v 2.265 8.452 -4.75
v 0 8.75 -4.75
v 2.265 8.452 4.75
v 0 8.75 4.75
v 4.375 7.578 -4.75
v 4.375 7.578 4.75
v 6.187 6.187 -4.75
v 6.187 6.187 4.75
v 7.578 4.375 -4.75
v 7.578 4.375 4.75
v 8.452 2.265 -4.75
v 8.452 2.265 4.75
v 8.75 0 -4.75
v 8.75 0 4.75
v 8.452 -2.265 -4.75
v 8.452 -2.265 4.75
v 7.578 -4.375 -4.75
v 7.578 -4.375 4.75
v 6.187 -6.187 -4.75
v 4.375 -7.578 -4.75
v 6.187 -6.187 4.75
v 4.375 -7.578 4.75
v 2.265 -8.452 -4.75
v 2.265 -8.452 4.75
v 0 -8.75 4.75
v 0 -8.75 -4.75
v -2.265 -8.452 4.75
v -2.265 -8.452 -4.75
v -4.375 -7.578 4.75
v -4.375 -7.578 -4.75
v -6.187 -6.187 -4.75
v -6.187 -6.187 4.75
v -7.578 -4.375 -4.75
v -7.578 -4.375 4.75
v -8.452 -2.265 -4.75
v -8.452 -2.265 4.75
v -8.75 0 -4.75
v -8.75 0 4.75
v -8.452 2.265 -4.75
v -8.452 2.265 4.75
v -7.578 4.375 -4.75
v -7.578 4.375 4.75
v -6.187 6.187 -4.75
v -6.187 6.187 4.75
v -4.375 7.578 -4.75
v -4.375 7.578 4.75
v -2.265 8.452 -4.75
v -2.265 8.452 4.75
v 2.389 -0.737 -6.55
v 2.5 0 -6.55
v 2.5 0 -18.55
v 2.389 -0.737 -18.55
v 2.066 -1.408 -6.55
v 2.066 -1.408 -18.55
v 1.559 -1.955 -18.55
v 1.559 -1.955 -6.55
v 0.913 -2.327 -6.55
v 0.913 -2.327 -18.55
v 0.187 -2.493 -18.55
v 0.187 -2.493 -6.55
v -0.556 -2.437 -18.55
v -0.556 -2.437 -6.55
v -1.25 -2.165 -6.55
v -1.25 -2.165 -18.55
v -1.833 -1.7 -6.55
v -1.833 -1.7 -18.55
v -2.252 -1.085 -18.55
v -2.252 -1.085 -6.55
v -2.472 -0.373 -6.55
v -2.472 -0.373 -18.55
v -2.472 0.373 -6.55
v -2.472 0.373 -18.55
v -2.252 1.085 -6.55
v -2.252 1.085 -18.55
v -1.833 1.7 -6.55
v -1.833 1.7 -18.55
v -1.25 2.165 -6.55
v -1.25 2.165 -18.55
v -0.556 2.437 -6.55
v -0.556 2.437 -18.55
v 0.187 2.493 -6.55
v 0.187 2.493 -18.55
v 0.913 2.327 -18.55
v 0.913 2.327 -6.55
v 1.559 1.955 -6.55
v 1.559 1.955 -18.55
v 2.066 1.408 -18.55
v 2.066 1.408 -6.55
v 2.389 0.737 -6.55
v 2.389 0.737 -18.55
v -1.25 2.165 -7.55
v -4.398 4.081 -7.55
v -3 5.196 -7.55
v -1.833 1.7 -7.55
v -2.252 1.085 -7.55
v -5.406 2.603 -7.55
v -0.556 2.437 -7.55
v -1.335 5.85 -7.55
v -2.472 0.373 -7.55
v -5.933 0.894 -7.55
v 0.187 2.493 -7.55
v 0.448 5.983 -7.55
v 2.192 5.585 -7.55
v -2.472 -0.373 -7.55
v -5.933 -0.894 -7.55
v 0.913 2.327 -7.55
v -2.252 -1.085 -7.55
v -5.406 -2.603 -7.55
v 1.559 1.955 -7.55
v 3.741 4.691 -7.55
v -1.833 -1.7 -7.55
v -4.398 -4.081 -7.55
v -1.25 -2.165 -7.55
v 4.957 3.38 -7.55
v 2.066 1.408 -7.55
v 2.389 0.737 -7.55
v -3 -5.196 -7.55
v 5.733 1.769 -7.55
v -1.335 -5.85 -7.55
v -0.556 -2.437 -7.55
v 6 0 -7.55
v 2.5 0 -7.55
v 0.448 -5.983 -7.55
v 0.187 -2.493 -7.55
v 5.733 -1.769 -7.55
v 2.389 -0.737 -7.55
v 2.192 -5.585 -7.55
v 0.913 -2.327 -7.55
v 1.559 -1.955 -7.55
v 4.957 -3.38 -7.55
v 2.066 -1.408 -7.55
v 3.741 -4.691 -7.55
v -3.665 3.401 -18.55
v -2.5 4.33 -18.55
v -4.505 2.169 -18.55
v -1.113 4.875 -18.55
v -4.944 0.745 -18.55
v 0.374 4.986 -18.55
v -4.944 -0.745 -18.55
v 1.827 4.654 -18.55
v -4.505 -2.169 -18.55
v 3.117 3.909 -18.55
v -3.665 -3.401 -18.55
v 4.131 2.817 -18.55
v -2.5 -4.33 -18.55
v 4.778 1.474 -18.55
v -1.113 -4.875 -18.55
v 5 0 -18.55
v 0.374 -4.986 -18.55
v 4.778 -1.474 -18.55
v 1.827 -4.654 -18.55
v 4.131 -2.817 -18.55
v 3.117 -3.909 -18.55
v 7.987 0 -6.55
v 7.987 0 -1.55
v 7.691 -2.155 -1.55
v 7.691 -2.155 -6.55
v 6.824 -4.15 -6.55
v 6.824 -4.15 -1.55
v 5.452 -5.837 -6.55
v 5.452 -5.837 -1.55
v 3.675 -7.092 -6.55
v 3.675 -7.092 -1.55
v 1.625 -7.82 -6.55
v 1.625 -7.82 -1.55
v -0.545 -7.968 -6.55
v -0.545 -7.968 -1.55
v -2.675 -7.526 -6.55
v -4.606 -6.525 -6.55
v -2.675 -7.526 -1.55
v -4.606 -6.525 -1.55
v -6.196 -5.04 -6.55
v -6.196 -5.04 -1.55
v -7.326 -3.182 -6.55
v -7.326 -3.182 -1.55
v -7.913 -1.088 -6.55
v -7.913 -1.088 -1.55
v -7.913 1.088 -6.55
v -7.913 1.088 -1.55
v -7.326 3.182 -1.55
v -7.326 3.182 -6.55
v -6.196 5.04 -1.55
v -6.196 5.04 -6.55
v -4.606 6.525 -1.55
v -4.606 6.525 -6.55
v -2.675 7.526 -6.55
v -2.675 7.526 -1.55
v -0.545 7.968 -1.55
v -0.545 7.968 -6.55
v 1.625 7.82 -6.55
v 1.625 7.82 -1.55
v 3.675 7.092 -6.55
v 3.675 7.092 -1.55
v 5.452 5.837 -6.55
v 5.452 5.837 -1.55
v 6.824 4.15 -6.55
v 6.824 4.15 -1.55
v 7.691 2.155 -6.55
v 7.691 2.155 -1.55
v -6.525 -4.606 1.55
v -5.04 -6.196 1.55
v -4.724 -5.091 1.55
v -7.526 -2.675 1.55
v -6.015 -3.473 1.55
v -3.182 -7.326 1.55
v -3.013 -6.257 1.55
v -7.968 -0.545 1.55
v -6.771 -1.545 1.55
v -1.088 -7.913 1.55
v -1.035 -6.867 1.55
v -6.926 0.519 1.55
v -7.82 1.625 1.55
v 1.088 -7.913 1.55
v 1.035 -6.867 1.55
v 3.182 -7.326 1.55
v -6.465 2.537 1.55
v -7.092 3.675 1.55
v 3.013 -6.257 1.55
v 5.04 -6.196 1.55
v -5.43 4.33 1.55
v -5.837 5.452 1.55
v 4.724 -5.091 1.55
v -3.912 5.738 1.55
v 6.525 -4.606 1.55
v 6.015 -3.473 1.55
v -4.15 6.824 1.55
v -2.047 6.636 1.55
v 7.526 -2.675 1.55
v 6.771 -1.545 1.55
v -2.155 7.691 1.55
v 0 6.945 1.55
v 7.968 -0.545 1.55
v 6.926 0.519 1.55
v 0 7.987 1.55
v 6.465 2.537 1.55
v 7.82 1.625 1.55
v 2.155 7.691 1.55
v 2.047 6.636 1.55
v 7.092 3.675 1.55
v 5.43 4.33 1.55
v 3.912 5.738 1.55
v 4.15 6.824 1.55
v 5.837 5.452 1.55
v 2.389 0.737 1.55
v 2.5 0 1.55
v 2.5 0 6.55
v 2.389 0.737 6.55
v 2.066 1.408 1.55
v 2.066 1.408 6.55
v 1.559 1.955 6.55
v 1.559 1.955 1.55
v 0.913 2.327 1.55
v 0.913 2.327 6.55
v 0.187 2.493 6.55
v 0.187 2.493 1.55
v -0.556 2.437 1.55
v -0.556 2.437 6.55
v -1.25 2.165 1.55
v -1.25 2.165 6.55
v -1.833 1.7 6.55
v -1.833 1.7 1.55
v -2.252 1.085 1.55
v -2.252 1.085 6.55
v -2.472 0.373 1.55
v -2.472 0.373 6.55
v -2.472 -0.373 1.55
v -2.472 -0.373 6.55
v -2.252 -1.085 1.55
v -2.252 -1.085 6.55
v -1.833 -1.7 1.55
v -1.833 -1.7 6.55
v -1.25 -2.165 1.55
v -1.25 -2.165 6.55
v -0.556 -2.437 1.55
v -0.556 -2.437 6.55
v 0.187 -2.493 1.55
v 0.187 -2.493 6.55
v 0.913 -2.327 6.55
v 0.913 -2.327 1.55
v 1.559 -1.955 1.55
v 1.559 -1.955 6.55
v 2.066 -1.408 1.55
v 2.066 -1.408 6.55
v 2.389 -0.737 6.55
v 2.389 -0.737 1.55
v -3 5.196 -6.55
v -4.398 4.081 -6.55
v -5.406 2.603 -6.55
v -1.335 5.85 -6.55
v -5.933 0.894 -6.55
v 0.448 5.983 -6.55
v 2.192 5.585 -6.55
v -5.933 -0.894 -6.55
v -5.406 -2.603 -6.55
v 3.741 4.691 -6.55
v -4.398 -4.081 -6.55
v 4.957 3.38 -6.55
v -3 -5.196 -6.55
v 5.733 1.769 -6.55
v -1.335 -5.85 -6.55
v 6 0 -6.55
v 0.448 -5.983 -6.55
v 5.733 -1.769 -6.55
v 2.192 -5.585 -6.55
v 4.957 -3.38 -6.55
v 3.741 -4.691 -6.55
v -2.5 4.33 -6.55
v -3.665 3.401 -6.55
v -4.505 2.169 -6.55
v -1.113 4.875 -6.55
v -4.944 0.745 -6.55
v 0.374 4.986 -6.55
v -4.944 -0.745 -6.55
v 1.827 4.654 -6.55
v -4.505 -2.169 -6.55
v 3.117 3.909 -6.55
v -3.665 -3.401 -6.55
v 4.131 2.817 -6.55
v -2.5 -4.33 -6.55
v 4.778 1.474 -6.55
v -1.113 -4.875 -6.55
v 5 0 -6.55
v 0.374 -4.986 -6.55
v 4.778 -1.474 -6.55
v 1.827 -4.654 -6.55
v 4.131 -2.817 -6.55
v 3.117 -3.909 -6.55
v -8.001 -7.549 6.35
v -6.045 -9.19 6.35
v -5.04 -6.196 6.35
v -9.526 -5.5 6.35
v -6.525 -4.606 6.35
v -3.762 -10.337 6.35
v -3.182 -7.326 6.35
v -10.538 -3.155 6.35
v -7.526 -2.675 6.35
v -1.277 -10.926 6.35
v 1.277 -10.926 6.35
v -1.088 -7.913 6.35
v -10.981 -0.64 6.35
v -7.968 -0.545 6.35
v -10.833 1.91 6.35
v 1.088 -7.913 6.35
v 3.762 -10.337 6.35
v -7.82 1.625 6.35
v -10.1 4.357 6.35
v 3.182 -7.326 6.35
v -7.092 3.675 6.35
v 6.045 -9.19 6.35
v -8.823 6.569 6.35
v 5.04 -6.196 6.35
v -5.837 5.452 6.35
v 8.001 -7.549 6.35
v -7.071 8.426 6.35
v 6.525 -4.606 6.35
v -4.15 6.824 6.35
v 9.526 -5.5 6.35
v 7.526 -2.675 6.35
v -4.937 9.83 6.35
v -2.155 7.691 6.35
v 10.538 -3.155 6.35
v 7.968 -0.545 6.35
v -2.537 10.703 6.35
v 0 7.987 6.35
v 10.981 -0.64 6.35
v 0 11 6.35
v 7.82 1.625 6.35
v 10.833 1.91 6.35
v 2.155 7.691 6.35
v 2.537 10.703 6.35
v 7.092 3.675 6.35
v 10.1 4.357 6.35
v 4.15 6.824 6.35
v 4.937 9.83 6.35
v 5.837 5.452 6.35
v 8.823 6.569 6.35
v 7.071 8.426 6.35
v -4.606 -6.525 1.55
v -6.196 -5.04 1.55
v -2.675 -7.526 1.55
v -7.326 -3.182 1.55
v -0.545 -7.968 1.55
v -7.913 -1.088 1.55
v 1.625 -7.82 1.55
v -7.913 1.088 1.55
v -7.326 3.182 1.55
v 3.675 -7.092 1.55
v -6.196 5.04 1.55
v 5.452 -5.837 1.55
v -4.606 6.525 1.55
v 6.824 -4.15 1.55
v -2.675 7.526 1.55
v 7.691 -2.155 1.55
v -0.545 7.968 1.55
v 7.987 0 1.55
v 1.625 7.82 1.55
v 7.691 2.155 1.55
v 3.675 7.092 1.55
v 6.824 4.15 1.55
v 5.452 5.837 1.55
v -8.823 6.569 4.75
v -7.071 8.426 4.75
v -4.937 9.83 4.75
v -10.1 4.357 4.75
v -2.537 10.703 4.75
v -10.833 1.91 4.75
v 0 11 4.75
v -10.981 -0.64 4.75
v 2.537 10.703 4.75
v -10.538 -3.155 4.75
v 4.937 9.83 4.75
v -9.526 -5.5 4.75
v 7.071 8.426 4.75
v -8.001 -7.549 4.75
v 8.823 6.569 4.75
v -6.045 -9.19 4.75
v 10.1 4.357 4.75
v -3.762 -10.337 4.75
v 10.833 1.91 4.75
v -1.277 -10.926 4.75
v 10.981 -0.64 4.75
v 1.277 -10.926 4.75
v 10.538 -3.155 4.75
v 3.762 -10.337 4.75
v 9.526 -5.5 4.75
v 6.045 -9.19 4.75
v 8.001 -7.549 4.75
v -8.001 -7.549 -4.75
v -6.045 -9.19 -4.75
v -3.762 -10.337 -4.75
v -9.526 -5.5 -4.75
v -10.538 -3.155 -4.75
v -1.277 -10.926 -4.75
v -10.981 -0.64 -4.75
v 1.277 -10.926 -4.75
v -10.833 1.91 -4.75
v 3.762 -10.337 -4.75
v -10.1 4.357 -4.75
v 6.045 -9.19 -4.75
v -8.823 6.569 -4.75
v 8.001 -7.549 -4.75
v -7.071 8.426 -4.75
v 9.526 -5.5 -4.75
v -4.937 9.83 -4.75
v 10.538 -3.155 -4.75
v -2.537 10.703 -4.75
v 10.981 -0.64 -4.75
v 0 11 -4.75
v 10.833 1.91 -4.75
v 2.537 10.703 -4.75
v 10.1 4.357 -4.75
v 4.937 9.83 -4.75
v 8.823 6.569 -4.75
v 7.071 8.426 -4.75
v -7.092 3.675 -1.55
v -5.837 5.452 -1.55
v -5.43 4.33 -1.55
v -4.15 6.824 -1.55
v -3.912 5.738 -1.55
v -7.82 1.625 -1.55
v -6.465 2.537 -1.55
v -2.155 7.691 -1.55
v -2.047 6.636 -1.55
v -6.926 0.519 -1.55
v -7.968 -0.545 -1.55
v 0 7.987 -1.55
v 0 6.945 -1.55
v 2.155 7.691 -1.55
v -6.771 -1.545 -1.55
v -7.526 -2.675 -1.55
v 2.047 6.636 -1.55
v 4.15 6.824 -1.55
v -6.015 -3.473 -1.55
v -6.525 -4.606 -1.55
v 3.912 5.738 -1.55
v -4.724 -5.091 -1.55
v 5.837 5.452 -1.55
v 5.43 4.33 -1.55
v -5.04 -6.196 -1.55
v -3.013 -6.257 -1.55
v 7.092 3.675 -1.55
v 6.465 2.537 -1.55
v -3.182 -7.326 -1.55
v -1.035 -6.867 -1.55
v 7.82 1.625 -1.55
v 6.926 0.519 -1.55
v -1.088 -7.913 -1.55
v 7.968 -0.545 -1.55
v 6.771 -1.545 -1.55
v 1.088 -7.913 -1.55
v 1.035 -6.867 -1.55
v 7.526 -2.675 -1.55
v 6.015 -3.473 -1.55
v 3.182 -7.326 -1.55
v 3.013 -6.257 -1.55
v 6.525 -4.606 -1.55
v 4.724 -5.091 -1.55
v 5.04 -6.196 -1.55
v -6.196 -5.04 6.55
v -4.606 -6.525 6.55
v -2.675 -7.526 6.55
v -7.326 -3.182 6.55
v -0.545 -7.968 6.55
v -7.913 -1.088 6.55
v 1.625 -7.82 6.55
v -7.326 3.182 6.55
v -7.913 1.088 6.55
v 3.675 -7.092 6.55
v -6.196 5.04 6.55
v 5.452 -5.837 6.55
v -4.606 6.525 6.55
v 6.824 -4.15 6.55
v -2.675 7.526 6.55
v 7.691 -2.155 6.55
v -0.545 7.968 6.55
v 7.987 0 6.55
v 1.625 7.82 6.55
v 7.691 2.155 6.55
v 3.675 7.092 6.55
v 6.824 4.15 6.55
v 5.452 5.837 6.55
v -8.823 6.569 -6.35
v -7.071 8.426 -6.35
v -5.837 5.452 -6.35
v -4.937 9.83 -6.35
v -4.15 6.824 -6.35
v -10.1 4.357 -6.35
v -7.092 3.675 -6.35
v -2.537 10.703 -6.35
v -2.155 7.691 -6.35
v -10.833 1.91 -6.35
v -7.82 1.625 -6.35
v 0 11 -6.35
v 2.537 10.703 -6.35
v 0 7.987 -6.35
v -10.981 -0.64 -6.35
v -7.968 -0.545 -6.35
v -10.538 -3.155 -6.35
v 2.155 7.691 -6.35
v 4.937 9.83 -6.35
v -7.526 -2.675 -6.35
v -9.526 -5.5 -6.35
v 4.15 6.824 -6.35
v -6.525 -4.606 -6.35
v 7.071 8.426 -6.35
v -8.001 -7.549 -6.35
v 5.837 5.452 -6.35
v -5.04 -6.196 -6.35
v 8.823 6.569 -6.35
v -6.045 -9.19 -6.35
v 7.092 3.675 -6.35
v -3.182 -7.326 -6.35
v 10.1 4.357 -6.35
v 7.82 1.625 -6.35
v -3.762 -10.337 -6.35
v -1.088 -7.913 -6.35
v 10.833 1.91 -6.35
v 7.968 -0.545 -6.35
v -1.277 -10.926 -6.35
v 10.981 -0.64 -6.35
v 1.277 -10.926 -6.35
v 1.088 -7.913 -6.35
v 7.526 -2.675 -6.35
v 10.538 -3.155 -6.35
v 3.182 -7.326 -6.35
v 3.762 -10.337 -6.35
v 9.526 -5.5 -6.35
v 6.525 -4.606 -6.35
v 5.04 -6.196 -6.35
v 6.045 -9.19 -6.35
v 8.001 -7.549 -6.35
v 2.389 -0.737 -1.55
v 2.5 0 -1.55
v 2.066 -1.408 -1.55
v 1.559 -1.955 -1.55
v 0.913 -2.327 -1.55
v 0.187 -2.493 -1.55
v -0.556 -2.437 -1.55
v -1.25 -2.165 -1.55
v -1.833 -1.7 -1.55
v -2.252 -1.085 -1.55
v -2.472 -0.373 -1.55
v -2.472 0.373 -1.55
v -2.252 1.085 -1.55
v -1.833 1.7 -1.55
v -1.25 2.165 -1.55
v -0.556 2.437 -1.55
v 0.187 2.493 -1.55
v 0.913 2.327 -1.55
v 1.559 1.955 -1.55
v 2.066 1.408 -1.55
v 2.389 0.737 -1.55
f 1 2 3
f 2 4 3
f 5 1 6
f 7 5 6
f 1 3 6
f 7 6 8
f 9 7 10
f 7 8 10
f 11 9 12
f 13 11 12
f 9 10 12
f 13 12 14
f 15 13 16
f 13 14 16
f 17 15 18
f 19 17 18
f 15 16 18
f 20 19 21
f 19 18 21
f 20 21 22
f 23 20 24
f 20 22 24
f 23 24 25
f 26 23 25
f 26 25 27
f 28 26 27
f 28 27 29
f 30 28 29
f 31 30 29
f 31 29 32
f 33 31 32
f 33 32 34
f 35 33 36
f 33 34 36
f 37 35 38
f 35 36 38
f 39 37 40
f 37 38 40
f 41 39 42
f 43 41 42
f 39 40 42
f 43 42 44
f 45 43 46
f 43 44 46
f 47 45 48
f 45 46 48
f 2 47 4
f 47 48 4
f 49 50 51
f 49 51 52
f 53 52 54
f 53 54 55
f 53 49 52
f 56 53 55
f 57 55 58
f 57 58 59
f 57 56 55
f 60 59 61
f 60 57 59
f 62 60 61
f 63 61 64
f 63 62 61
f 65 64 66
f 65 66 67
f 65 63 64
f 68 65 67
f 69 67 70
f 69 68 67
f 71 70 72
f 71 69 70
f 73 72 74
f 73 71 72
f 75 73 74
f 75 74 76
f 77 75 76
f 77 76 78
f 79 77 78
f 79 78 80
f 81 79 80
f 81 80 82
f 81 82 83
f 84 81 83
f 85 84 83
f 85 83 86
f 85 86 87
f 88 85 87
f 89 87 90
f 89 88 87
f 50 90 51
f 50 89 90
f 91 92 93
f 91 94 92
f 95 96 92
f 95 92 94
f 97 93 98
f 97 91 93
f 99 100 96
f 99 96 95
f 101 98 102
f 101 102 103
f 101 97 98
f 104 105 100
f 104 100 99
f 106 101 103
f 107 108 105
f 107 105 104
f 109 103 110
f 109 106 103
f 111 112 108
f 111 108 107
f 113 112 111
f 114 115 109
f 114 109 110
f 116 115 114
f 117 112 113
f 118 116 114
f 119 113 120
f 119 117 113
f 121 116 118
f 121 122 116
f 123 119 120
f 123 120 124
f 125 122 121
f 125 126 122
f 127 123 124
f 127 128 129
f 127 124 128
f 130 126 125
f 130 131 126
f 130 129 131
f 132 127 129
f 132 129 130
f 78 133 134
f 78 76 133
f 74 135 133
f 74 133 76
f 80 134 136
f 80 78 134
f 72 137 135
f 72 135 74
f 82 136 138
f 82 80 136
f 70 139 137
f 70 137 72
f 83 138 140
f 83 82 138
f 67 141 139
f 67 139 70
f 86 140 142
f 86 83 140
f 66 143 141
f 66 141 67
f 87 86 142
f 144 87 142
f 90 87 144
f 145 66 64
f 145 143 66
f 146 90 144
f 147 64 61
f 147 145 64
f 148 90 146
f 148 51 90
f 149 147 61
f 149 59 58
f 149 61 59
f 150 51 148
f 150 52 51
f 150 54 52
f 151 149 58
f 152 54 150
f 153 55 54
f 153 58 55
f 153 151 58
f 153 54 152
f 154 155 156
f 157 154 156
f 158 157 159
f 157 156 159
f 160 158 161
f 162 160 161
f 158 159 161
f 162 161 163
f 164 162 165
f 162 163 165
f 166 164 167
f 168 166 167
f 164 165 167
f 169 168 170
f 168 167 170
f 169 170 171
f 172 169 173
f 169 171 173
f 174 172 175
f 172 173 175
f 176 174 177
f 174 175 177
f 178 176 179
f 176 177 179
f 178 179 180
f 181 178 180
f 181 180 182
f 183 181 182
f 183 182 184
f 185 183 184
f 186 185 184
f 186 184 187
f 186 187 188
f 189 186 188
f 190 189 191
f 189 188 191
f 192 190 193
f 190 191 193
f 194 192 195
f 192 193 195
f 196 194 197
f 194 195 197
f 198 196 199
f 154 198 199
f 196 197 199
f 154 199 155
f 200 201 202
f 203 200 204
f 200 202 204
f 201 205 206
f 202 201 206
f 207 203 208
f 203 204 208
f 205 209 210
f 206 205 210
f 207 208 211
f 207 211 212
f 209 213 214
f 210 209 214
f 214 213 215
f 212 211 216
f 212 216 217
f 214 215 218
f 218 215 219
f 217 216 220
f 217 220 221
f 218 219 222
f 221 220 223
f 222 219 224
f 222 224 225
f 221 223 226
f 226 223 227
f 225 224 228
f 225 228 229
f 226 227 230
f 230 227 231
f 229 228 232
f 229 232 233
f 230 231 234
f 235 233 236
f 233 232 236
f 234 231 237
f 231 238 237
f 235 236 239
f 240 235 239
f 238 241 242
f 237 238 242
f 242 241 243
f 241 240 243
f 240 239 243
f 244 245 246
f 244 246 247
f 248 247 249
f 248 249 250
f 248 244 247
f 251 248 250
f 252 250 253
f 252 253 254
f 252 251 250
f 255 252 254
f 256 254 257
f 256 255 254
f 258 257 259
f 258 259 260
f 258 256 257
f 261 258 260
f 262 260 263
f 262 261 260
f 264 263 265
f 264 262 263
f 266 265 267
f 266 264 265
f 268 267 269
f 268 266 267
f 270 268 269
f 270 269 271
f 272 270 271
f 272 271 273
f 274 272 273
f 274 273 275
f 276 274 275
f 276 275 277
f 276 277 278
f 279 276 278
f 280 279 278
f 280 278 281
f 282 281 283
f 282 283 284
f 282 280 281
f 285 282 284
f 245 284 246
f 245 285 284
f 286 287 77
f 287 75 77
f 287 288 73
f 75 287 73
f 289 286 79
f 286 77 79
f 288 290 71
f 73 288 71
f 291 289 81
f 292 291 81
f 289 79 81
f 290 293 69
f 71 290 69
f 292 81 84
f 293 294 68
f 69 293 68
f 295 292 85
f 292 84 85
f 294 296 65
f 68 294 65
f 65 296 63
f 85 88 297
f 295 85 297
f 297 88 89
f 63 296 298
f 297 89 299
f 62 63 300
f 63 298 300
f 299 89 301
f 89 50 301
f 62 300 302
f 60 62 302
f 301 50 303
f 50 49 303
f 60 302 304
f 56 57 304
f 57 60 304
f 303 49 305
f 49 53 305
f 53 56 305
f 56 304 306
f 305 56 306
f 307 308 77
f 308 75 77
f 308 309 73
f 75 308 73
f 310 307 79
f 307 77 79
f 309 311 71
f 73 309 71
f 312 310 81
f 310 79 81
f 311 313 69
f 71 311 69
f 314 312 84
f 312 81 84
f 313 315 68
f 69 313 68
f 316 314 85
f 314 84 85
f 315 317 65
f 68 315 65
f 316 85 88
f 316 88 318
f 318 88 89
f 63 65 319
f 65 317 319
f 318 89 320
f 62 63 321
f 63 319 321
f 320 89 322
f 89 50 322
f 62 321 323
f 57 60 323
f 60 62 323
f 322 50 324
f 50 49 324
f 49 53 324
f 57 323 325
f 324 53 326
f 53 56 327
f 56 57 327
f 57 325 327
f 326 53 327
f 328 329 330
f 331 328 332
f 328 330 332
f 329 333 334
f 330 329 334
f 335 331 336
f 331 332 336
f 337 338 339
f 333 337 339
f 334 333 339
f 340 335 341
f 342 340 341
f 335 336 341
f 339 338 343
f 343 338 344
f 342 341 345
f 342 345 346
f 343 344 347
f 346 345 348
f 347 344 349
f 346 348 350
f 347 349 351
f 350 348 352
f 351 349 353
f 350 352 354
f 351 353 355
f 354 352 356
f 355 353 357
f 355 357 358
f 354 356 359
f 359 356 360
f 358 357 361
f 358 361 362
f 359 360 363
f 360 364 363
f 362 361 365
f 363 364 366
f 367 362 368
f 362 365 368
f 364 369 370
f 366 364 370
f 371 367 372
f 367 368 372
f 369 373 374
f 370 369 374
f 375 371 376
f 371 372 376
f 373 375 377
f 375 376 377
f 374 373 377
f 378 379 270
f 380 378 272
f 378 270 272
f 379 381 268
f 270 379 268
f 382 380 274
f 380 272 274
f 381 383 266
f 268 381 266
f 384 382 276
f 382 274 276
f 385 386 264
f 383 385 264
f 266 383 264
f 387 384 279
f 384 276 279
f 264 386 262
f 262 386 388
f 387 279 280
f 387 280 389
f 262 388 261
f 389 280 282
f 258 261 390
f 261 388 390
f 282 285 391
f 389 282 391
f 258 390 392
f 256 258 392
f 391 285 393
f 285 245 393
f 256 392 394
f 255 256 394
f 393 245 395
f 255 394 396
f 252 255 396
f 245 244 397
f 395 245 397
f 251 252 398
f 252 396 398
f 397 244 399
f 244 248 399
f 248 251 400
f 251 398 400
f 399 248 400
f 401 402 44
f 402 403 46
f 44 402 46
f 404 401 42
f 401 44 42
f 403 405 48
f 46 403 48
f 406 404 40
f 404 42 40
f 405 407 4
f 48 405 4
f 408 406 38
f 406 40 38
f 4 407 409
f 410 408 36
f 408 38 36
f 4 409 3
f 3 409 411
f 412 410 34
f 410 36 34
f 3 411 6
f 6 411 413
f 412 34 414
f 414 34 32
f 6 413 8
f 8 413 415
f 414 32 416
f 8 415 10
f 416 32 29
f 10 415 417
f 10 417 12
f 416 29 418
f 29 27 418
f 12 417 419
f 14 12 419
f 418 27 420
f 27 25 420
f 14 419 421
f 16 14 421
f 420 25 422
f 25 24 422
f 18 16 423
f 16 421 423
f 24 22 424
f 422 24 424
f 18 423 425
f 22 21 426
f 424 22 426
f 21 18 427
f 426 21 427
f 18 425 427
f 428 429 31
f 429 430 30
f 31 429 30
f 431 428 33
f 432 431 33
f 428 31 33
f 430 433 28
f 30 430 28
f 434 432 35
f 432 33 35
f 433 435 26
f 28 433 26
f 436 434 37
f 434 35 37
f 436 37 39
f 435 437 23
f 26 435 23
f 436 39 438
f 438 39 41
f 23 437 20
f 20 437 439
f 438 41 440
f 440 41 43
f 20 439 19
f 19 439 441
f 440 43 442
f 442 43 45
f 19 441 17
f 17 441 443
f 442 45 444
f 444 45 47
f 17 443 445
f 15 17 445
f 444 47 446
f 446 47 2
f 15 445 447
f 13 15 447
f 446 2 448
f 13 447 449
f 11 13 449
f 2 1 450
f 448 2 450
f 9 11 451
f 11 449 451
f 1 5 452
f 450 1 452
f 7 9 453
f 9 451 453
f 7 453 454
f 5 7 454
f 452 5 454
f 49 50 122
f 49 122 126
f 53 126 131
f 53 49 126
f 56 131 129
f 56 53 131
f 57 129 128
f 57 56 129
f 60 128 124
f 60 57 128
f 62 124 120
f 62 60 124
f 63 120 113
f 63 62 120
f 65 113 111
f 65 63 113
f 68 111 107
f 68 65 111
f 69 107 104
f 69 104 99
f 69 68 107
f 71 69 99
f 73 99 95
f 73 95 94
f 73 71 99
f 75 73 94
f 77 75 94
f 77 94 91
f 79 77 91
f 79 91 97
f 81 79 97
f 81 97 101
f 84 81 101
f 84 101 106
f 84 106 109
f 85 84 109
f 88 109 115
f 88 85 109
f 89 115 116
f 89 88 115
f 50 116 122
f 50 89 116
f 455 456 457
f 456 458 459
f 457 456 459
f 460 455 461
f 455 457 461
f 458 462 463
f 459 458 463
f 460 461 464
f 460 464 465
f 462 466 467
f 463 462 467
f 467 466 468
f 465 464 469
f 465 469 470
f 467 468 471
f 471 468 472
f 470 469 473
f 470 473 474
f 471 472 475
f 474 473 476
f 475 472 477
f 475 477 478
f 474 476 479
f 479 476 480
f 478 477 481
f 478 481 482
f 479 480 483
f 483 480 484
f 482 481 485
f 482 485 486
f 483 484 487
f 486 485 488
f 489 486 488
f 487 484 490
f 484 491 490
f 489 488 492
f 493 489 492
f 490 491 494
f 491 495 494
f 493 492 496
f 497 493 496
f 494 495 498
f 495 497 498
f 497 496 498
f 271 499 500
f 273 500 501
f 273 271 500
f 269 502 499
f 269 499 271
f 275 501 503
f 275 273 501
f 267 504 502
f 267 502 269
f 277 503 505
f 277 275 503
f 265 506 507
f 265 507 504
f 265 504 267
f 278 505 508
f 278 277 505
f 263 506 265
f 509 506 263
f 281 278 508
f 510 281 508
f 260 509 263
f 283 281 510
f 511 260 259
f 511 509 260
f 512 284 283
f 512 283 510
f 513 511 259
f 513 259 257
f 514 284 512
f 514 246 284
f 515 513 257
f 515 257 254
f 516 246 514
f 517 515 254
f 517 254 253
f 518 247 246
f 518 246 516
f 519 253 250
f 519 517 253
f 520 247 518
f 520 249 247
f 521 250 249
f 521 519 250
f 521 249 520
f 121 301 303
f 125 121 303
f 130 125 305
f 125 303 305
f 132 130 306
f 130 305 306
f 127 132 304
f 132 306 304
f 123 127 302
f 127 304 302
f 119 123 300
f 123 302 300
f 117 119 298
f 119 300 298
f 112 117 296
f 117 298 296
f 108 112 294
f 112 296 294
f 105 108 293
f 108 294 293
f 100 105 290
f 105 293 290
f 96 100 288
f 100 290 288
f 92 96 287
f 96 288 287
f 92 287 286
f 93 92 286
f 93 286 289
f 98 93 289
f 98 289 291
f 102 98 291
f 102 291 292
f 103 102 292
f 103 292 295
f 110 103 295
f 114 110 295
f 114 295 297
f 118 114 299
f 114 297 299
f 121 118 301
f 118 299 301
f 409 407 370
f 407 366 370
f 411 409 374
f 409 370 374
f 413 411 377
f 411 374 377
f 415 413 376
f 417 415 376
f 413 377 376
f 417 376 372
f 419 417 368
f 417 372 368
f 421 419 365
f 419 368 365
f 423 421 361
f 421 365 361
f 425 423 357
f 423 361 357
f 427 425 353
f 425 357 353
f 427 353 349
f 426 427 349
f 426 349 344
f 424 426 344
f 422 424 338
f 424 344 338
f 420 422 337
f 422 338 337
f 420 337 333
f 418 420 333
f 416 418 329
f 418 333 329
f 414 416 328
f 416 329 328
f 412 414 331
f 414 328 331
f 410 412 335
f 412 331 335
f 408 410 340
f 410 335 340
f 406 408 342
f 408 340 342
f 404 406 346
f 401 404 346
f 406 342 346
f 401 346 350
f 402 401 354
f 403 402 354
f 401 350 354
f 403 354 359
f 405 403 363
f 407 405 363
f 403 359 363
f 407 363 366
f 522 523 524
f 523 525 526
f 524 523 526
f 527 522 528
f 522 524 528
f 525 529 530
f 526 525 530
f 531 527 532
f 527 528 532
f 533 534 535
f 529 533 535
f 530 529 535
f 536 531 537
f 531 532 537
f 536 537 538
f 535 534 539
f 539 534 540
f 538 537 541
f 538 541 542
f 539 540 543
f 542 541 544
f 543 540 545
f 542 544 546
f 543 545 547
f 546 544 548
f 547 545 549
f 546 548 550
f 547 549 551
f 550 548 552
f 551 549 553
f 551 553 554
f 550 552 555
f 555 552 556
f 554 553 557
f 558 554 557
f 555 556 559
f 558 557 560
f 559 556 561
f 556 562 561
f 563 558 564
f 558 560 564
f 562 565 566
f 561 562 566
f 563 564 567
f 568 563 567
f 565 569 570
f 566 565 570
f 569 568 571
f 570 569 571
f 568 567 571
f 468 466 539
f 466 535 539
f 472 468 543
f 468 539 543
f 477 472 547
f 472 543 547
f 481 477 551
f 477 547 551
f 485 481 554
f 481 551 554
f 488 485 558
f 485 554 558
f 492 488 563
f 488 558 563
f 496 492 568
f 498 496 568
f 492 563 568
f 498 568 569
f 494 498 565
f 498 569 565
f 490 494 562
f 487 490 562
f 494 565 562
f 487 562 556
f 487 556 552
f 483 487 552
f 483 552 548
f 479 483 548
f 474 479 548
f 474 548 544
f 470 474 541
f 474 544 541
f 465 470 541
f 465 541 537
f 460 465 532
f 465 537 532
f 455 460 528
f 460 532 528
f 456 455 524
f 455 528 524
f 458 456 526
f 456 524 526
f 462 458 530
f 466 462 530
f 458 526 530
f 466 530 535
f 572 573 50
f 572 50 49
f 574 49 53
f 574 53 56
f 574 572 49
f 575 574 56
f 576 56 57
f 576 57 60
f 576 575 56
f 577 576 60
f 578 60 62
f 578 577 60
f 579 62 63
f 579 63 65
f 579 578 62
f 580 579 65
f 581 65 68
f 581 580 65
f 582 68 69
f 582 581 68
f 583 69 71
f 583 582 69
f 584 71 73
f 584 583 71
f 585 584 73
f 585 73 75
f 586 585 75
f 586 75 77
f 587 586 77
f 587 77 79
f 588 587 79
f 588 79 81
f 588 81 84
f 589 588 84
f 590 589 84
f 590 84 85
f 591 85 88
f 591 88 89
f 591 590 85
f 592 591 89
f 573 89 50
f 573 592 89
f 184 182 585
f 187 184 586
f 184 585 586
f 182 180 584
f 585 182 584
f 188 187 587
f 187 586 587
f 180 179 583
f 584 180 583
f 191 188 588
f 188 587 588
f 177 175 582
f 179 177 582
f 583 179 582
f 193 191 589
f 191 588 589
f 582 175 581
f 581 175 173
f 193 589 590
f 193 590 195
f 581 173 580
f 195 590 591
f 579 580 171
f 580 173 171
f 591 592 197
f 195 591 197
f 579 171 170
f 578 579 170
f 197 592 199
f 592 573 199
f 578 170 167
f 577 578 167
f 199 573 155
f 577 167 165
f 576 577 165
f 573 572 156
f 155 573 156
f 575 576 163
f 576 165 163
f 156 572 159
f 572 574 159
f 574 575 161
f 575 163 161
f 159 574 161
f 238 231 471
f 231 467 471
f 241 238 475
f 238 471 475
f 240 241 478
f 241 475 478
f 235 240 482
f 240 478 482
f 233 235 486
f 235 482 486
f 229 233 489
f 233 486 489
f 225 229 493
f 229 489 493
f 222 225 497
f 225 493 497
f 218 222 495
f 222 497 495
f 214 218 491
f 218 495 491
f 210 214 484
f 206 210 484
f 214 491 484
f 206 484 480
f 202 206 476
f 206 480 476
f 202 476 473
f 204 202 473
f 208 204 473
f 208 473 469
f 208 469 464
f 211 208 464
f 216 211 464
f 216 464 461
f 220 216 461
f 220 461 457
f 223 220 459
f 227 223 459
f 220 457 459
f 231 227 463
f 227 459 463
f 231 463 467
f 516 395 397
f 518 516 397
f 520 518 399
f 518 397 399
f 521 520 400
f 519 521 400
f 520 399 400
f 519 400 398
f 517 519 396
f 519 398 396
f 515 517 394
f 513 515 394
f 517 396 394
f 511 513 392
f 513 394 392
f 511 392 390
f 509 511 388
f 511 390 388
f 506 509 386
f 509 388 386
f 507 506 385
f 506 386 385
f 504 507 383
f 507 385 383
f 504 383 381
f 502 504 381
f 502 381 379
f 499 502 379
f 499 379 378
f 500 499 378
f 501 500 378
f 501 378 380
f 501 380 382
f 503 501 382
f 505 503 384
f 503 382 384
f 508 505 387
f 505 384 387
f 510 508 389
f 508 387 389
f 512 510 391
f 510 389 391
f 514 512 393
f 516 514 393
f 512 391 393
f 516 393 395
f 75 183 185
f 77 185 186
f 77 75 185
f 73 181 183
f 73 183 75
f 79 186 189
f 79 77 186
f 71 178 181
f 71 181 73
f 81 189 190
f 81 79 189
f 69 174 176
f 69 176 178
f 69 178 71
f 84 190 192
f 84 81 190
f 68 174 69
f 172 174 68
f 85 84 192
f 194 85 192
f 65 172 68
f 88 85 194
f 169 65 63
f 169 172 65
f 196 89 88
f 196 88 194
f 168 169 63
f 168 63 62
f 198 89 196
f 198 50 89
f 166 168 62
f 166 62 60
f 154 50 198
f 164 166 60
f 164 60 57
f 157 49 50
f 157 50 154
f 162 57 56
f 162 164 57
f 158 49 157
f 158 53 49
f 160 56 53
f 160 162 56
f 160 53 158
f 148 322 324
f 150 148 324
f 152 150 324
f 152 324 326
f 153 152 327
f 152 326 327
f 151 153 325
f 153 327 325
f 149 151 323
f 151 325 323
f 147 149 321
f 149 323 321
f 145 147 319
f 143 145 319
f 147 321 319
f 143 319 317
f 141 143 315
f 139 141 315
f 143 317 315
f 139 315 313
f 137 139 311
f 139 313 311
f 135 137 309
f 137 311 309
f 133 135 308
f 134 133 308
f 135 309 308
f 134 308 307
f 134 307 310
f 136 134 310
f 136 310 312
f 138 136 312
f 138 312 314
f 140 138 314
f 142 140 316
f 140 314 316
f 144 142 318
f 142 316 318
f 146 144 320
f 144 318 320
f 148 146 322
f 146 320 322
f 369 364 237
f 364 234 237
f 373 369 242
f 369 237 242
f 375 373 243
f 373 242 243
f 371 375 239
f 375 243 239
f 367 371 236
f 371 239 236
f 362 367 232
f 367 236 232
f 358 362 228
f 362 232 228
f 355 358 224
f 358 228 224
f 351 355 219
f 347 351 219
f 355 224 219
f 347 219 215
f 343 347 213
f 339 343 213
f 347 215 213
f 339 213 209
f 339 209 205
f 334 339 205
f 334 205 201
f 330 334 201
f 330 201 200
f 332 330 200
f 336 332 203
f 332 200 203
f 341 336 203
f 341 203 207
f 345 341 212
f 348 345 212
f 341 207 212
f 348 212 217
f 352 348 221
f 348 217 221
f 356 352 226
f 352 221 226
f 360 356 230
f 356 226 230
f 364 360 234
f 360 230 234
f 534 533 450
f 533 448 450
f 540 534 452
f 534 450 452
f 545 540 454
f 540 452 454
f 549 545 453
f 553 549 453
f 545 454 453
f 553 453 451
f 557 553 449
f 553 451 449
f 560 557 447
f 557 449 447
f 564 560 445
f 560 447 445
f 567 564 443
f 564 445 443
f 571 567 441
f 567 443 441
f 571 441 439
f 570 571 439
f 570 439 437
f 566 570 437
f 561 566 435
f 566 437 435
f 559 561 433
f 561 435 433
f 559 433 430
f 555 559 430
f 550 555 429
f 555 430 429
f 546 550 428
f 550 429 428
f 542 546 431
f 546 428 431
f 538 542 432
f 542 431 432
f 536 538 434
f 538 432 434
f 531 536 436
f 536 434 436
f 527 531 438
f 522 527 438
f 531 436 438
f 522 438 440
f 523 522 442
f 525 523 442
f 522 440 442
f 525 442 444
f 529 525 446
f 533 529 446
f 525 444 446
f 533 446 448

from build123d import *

# Parameters (mm, degrees)
F2_R     = 7.987
F2_R_2   = 2.5
F3_DEPTH = 5
F4_R     = 7.987
F4_R_2   = 2.5
F5_DEPTH = 5
F6_R     = 5
F6_R_2   = 2.5
F7_DEPTH = 12
F8_R     = 6
F8_R_2   = 2.5
F9_DEPTH = 1


with BuildPart() as f1:
    # F0 (on Right) → F1 (revolve)
    with BuildSketch(Plane.YZ):
        Polygon((11, 4.75), (11, 6.35), (7.987, 6.35), (7.987, 1.55), (6.945, 1.55), (6.945, 0), (6.945, -1.55), (7.987, -1.55), (7.987, -6.35), (11, -6.35), (11, -4.75), (8.75, -4.75), (8.75, 0), (8.75, 4.75), align=None)
    revolve(axis=Axis((0, 0, -0.299537), (0, 0, -1)))


with BuildPart() as f3:
    # F2 (on face) → F3 (new body)
    with BuildSketch(Plane(origin=(0, 0, -1.55), x_dir=(1, 0, 0), z_dir=(0, 0, -1))):
        Circle(F2_R)
        Circle(F2_R_2, mode=Mode.SUBTRACT)
    extrude(amount=F3_DEPTH)


with BuildPart() as f5:
    # F4 (on face) → F5 (new body)
    with BuildSketch(Plane.XY.offset(1.55)):
        Circle(F4_R)
        Circle(F4_R_2, mode=Mode.SUBTRACT)
    extrude(amount=F5_DEPTH)


with BuildPart() as f7:
    # F6 (on face) → F7 (new body)
    with BuildSketch(Plane(origin=(0, 0, -6.55), x_dir=(1, 0, 0), z_dir=(0, 0, -1))):
        Circle(F6_R)
        Circle(F6_R_2, mode=Mode.SUBTRACT)
    extrude(amount=F7_DEPTH)


with BuildPart() as f9:
    # F8 (on face) → F9 (new body)
    with BuildSketch(Plane(origin=(0, 0, -6.55), x_dir=(1, 0, 0), z_dir=(0, 0, -1))):
        Circle(F8_R)
        Circle(F8_R_2, mode=Mode.SUBTRACT)
    extrude(amount=F9_DEPTH)


solid = Compound([f1.part, f3.part, f5.part, f7.part, f9.part])
